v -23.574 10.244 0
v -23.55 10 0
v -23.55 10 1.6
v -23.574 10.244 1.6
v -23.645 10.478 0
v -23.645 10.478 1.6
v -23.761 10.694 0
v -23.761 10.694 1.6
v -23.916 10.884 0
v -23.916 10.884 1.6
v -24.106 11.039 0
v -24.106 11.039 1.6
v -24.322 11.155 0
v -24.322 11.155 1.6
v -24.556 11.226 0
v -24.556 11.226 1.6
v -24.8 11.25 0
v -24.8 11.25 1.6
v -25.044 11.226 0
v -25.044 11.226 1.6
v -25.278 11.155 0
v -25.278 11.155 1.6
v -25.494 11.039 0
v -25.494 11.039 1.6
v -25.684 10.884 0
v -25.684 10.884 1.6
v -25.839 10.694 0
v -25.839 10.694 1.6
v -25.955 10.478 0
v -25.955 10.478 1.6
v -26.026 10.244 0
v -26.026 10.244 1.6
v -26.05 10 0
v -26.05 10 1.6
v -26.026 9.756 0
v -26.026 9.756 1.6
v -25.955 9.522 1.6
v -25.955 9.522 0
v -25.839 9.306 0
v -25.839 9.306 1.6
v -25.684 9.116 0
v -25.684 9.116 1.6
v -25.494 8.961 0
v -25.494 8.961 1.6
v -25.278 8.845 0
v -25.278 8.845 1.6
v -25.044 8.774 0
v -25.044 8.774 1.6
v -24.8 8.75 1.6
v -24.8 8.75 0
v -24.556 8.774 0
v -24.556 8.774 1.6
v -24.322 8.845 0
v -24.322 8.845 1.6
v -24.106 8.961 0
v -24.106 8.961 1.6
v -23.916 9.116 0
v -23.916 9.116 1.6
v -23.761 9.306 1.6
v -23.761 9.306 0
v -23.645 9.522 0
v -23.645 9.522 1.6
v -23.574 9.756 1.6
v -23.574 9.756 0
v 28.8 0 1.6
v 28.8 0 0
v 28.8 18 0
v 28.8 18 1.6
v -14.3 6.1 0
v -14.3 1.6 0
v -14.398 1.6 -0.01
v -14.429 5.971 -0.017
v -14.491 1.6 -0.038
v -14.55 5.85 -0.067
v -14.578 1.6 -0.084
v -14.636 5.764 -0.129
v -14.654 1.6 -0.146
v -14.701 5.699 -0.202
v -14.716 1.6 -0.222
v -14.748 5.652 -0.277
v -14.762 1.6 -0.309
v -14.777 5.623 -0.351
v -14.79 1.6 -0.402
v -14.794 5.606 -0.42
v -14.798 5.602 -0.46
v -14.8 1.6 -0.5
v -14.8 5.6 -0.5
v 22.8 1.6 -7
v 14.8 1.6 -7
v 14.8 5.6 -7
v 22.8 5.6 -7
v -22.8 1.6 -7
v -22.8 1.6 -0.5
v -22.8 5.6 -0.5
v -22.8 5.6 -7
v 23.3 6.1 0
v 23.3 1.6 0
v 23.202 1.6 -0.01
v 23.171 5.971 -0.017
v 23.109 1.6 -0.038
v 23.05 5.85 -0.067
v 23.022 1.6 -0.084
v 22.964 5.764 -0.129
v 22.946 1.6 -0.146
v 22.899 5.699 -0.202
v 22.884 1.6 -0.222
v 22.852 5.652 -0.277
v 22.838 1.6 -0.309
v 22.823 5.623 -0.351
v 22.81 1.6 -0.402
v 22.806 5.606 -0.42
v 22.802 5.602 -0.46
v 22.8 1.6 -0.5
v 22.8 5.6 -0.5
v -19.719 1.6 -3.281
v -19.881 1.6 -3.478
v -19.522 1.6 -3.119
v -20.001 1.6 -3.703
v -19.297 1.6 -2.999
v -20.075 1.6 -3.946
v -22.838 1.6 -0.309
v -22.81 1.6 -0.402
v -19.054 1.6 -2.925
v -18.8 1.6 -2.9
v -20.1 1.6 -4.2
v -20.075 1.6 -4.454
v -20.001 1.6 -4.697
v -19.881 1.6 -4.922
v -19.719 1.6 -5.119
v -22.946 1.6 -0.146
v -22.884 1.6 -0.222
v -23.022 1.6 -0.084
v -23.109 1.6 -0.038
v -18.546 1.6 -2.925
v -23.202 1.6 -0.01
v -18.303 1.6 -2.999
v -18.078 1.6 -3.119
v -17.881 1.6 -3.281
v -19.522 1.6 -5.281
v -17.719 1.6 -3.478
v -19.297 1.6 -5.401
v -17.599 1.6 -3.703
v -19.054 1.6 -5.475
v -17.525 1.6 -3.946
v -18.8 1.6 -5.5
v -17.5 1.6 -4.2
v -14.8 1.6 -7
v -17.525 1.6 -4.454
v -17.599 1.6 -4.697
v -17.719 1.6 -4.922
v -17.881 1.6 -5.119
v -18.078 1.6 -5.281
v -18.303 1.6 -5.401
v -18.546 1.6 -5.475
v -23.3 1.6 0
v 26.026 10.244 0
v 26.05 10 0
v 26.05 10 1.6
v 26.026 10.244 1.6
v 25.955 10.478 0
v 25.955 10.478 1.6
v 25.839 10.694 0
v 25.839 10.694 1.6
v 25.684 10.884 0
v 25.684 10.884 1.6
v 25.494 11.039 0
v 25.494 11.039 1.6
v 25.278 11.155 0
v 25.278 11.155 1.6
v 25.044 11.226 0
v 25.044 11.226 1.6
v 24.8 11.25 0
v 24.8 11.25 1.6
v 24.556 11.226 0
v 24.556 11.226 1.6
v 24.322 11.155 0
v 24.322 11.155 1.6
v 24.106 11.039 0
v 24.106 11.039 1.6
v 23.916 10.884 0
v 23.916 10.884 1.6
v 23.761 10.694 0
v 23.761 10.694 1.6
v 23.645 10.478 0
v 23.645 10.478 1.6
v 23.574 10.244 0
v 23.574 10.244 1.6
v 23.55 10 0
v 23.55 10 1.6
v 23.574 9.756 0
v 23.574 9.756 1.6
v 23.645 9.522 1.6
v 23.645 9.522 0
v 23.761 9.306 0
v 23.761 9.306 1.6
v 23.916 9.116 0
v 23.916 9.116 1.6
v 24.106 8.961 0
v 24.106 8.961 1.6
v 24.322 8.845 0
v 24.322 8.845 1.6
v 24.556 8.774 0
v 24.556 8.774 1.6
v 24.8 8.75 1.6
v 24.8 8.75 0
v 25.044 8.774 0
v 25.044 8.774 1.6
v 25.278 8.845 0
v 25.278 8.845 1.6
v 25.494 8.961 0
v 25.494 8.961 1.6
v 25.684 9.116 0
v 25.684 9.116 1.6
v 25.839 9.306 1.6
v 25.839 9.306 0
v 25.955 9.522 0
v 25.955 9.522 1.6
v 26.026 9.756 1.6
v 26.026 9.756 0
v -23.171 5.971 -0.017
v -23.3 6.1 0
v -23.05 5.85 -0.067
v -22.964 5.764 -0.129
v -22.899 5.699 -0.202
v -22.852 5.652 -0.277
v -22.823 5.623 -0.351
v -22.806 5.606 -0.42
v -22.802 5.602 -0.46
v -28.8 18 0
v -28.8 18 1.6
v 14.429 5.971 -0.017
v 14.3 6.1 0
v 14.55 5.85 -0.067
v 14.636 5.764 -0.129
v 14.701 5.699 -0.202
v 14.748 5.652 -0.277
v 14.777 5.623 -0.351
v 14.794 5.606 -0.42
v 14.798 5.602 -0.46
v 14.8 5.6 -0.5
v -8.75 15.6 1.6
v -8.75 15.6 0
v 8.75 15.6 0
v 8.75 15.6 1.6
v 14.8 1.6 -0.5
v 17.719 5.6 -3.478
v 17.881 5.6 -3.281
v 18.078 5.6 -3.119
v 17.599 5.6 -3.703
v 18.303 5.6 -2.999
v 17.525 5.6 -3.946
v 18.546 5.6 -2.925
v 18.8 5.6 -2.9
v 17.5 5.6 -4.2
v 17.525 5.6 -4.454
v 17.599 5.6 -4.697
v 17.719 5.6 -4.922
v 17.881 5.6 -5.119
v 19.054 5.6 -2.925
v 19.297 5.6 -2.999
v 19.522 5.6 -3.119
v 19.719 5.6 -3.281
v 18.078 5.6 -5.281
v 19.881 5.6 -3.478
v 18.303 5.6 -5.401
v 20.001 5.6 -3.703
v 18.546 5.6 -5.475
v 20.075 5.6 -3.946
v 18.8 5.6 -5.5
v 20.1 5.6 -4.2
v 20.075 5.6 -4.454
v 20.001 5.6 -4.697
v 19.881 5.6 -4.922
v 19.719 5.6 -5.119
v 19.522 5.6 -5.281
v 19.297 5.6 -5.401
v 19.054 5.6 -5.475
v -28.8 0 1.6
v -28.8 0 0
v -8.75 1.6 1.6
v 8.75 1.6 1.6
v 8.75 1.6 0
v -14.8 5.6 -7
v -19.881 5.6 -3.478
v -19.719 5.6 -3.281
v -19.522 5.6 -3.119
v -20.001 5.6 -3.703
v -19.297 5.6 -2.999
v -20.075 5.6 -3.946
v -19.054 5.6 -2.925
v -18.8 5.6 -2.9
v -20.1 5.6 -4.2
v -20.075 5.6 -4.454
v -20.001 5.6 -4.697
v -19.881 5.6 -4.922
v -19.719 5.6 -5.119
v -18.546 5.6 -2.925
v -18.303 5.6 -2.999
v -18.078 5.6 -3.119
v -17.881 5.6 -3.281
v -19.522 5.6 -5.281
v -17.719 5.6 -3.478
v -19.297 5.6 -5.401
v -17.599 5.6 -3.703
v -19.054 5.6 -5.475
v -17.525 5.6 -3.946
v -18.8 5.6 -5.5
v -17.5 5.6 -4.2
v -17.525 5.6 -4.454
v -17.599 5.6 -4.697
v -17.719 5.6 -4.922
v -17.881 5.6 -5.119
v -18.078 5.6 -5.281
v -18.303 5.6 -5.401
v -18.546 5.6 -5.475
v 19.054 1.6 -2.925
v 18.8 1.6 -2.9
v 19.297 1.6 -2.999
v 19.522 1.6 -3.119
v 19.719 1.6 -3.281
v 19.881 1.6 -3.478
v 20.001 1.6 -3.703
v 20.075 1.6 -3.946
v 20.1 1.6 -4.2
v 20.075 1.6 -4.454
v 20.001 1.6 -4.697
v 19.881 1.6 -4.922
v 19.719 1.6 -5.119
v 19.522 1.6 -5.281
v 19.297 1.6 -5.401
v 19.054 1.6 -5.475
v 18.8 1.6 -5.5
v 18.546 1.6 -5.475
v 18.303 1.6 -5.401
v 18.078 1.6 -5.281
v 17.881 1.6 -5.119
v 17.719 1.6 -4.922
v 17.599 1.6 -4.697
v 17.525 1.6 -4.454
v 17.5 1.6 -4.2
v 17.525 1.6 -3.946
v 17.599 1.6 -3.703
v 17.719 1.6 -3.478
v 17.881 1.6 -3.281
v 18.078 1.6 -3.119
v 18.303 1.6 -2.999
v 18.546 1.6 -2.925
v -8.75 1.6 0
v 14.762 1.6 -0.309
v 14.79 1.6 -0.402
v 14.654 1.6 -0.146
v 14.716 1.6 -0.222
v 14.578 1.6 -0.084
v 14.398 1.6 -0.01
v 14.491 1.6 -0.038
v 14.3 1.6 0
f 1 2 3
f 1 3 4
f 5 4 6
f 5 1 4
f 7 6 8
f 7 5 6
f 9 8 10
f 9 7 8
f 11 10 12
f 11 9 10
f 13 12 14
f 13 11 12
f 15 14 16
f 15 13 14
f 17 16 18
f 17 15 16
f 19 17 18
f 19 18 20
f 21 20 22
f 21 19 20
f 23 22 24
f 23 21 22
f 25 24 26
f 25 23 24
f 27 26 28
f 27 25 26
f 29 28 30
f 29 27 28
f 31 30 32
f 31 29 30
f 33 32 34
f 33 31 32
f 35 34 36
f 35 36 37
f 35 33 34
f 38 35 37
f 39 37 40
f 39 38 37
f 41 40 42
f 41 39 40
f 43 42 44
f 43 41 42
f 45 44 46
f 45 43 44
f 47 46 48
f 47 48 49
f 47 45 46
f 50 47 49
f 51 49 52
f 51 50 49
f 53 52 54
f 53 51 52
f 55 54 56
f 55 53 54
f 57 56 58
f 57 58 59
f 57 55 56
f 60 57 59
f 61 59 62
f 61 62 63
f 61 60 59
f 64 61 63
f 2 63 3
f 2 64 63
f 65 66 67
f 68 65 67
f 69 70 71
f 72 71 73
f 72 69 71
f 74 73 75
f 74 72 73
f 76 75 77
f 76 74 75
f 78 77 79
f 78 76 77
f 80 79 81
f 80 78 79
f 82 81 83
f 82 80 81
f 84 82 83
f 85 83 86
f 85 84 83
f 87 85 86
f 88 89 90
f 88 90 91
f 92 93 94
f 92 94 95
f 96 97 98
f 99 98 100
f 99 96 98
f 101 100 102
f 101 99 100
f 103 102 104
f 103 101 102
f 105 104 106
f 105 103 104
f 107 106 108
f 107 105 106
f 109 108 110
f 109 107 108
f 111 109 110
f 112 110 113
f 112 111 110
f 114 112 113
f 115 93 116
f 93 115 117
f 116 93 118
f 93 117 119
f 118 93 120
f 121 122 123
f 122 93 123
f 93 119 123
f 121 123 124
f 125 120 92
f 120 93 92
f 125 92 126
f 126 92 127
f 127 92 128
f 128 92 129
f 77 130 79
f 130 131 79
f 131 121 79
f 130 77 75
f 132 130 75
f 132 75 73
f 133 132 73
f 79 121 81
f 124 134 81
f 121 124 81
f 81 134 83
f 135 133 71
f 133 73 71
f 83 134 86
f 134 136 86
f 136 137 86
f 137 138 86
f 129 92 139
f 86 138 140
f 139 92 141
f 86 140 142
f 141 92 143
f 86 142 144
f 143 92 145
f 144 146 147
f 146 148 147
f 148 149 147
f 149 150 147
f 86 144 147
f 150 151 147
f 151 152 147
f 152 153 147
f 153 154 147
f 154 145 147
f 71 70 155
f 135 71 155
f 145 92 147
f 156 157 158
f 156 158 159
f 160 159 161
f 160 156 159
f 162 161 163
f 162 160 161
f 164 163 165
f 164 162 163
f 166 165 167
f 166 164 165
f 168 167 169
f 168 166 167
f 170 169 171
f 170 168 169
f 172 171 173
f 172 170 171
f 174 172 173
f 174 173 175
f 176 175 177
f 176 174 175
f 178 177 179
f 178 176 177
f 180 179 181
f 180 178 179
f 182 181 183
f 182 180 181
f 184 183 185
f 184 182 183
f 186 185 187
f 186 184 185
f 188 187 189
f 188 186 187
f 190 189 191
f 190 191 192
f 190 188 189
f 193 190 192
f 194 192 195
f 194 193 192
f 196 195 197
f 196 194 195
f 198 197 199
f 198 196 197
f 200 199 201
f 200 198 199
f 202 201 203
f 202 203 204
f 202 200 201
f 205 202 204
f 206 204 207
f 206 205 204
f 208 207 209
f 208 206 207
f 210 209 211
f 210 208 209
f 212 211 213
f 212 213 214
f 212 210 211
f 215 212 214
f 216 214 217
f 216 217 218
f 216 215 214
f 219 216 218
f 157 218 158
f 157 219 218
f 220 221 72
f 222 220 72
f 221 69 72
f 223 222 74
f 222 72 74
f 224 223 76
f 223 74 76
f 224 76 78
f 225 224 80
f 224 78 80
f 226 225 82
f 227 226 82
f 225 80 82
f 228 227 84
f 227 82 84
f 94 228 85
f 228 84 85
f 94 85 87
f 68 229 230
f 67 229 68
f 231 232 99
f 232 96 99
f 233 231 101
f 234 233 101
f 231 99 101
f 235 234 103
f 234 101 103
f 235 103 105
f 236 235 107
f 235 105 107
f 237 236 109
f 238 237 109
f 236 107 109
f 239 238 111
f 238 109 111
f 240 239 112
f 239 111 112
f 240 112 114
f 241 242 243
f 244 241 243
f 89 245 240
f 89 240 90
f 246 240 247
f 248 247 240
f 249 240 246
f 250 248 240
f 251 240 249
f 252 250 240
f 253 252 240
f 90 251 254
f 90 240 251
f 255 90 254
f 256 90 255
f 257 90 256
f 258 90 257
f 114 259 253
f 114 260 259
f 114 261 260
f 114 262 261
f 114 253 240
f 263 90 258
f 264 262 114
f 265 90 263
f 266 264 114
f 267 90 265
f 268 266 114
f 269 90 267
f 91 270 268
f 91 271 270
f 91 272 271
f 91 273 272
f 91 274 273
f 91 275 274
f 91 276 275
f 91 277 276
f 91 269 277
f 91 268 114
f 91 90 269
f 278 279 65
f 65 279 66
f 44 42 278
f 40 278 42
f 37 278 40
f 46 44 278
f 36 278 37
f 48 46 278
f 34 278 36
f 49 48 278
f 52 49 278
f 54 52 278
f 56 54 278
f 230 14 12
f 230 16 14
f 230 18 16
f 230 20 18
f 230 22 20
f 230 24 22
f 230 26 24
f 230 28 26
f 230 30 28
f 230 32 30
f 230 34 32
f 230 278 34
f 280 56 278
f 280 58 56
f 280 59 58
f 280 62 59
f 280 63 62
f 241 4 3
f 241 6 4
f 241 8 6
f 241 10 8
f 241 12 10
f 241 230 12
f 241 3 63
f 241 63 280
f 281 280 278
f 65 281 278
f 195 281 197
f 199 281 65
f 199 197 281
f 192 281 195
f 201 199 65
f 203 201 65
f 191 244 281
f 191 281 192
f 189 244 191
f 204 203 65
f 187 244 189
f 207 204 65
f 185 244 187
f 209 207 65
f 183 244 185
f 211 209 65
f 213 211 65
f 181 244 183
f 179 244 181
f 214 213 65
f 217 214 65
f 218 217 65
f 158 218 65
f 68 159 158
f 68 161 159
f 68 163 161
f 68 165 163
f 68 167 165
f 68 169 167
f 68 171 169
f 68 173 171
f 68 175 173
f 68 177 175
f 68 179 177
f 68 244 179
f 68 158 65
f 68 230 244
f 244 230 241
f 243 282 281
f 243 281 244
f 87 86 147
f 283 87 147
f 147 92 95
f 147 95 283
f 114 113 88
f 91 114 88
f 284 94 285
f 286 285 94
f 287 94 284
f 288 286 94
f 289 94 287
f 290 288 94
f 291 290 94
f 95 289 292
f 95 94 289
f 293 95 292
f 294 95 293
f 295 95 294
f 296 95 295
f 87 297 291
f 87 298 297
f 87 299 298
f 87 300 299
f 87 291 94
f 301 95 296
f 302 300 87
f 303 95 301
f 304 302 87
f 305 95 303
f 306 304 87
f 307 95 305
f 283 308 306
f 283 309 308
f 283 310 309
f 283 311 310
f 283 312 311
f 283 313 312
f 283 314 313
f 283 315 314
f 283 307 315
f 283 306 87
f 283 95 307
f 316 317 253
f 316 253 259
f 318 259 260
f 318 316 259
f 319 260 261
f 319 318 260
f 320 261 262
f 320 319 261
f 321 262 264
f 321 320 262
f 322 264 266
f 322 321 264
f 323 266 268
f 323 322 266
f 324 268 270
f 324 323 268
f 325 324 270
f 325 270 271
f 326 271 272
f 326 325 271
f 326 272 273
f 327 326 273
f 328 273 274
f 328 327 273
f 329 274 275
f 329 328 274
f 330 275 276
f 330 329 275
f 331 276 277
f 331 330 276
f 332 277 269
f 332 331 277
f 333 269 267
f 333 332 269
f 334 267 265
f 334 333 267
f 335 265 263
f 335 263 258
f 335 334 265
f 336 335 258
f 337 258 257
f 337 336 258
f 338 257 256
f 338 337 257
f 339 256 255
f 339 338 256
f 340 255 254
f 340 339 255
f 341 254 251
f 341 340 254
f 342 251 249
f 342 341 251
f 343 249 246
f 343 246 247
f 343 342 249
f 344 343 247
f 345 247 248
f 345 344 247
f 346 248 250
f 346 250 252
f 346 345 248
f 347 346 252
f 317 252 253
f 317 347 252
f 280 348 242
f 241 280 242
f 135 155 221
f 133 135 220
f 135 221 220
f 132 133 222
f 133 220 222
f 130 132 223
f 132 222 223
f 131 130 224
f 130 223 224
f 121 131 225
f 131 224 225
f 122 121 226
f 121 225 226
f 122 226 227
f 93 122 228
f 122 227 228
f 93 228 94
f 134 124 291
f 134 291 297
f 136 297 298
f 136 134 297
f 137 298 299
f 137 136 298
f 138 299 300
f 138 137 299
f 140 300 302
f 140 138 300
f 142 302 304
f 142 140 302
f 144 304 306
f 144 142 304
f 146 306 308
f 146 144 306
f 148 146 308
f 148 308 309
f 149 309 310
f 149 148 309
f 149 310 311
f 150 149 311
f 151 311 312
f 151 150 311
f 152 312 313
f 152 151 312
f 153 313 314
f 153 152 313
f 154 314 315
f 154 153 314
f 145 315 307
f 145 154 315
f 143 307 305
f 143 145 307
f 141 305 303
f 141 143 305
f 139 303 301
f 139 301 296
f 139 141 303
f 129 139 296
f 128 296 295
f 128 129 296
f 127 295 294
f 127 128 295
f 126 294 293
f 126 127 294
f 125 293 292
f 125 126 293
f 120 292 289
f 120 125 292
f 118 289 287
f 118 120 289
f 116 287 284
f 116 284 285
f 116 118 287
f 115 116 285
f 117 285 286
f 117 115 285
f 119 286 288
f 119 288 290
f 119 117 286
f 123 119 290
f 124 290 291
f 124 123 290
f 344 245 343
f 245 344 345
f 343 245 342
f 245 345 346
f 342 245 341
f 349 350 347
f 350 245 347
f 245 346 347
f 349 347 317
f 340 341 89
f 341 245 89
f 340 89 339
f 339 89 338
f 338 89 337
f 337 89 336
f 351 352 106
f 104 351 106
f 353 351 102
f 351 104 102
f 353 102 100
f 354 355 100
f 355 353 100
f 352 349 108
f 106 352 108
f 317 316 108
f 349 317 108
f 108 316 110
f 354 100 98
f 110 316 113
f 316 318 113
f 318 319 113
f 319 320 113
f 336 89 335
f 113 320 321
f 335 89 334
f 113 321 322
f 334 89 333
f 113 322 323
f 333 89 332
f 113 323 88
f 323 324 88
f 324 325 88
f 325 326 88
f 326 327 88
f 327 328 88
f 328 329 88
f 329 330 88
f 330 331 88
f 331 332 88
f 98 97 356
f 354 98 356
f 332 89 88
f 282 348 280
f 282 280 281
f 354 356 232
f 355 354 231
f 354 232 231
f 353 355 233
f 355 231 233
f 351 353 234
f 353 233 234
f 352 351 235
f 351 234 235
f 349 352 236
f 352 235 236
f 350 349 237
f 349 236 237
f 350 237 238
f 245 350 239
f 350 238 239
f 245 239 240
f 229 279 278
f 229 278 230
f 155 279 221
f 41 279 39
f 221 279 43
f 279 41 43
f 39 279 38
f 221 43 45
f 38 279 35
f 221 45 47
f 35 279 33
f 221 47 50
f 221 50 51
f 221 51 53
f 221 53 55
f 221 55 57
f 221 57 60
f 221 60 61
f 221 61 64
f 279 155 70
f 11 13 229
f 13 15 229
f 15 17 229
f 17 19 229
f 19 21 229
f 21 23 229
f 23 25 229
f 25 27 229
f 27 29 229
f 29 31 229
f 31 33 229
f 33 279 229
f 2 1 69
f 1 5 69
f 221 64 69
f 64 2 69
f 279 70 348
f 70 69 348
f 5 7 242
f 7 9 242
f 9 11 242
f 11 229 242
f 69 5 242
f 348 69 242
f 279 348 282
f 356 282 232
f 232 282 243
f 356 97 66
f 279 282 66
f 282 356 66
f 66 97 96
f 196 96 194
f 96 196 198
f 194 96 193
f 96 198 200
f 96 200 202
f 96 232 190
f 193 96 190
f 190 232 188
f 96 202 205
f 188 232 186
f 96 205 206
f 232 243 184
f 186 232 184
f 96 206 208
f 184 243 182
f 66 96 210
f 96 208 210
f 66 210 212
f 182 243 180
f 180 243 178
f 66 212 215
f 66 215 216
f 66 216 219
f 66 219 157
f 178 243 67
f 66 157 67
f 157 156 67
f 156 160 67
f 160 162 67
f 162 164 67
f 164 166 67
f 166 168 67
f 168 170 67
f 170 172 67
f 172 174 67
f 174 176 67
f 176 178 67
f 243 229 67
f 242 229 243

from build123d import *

# Parameters (mm, degrees)
SKETCH1_W               = 57.6
SKETCH1_H               = 18
SKETCH1_R               = 1.25
BOSS_EXTRUDE1_DEPTH     = 1.6
SKETCH7_W               = 8
SKETCH7_H               = 7
SKETCH7_R               = 1.3
BOSS_EXTRUDE3_DEPTH     = 4
BOSS_EXTRUDE3_2_DEPTH   = 4
CUT_EXTRUDE1_DEPTH      = 35.676216633
CUT_EXTRUDE1_DEPTH_BACK = 35.676216633
SKETCH8_W               = 17.5
SKETCH8_H               = 14
FILLET1_R               = 0.5


with BuildPart() as part:
    # Sketch1 → Boss-Extrude1 (new body)
    with BuildSketch(Plane.XY):
        with Locations((0, 9)):
            Rectangle(SKETCH1_W, SKETCH1_H)
        with Locations((-24.8, 10)):
            Circle(SKETCH1_R, mode=Mode.SUBTRACT)
        with Locations((24.8, 10)):
            Circle(SKETCH1_R, mode=Mode.SUBTRACT)
    extrude(amount=BOSS_EXTRUDE1_DEPTH)

    # Sketch8 → Cut-Extrude1 (cut, two sides: drawn at the far end of the back side and taken through both)
    with BuildSketch(Plane.XY.offset(-CUT_EXTRUDE1_DEPTH_BACK)):
        with Locations((0, 8.6)):
            Rectangle(SKETCH8_W, SKETCH8_H)
    extrude(amount=CUT_EXTRUDE1_DEPTH + CUT_EXTRUDE1_DEPTH_BACK, mode=Mode.SUBTRACT)


with BuildPart() as body_2:
    # Sketch7 → Boss-Extrude3 (new body)
    with BuildSketch(Plane(origin=(0, 1.6, 0), x_dir=(1, 0, 0), z_dir=(0, 1, 0))):
        with Locations((-18.8, 3.5)):
            Rectangle(SKETCH7_W, SKETCH7_H)
        with Locations((-18.8, 4.2)):
            Circle(SKETCH7_R, mode=Mode.SUBTRACT)
    extrude(amount=BOSS_EXTRUDE3_DEPTH)


with BuildPart() as body_3:
    # Sketch7 → Boss-Extrude3 2 (new body)
    with BuildSketch(Plane(origin=(0, 1.6, 0), x_dir=(1, 0, 0), z_dir=(0, 1, 0))):
        with Locations((18.8, 3.5)):
            Rectangle(SKETCH7_W, SKETCH7_H)
        with Locations((18.8, 4.2)):
            Circle(SKETCH7_R, mode=Mode.SUBTRACT)
    extrude(amount=BOSS_EXTRUDE3_2_DEPTH)


with BuildPart() as body_2_1:
    add(body_2.part)

    # Combine1: union part, body 3
    add(part.part)
    add(body_3.part)

    # Fillet1
    fillet1_edges = [body_2_1.edges().sort_by_distance(p)[0] for p in [
        (-14.8, 3.6, 0),
        (-22.8, 3.6, 0),
        (-18.8, 5.6, 0),
        (14.8, 3.6, 0),
        (22.8, 3.6, 0),
        (18.8, 5.6, 0),
    ]]
    fillet(fillet1_edges, radius=FILLET1_R)


solid = body_2_1.part
